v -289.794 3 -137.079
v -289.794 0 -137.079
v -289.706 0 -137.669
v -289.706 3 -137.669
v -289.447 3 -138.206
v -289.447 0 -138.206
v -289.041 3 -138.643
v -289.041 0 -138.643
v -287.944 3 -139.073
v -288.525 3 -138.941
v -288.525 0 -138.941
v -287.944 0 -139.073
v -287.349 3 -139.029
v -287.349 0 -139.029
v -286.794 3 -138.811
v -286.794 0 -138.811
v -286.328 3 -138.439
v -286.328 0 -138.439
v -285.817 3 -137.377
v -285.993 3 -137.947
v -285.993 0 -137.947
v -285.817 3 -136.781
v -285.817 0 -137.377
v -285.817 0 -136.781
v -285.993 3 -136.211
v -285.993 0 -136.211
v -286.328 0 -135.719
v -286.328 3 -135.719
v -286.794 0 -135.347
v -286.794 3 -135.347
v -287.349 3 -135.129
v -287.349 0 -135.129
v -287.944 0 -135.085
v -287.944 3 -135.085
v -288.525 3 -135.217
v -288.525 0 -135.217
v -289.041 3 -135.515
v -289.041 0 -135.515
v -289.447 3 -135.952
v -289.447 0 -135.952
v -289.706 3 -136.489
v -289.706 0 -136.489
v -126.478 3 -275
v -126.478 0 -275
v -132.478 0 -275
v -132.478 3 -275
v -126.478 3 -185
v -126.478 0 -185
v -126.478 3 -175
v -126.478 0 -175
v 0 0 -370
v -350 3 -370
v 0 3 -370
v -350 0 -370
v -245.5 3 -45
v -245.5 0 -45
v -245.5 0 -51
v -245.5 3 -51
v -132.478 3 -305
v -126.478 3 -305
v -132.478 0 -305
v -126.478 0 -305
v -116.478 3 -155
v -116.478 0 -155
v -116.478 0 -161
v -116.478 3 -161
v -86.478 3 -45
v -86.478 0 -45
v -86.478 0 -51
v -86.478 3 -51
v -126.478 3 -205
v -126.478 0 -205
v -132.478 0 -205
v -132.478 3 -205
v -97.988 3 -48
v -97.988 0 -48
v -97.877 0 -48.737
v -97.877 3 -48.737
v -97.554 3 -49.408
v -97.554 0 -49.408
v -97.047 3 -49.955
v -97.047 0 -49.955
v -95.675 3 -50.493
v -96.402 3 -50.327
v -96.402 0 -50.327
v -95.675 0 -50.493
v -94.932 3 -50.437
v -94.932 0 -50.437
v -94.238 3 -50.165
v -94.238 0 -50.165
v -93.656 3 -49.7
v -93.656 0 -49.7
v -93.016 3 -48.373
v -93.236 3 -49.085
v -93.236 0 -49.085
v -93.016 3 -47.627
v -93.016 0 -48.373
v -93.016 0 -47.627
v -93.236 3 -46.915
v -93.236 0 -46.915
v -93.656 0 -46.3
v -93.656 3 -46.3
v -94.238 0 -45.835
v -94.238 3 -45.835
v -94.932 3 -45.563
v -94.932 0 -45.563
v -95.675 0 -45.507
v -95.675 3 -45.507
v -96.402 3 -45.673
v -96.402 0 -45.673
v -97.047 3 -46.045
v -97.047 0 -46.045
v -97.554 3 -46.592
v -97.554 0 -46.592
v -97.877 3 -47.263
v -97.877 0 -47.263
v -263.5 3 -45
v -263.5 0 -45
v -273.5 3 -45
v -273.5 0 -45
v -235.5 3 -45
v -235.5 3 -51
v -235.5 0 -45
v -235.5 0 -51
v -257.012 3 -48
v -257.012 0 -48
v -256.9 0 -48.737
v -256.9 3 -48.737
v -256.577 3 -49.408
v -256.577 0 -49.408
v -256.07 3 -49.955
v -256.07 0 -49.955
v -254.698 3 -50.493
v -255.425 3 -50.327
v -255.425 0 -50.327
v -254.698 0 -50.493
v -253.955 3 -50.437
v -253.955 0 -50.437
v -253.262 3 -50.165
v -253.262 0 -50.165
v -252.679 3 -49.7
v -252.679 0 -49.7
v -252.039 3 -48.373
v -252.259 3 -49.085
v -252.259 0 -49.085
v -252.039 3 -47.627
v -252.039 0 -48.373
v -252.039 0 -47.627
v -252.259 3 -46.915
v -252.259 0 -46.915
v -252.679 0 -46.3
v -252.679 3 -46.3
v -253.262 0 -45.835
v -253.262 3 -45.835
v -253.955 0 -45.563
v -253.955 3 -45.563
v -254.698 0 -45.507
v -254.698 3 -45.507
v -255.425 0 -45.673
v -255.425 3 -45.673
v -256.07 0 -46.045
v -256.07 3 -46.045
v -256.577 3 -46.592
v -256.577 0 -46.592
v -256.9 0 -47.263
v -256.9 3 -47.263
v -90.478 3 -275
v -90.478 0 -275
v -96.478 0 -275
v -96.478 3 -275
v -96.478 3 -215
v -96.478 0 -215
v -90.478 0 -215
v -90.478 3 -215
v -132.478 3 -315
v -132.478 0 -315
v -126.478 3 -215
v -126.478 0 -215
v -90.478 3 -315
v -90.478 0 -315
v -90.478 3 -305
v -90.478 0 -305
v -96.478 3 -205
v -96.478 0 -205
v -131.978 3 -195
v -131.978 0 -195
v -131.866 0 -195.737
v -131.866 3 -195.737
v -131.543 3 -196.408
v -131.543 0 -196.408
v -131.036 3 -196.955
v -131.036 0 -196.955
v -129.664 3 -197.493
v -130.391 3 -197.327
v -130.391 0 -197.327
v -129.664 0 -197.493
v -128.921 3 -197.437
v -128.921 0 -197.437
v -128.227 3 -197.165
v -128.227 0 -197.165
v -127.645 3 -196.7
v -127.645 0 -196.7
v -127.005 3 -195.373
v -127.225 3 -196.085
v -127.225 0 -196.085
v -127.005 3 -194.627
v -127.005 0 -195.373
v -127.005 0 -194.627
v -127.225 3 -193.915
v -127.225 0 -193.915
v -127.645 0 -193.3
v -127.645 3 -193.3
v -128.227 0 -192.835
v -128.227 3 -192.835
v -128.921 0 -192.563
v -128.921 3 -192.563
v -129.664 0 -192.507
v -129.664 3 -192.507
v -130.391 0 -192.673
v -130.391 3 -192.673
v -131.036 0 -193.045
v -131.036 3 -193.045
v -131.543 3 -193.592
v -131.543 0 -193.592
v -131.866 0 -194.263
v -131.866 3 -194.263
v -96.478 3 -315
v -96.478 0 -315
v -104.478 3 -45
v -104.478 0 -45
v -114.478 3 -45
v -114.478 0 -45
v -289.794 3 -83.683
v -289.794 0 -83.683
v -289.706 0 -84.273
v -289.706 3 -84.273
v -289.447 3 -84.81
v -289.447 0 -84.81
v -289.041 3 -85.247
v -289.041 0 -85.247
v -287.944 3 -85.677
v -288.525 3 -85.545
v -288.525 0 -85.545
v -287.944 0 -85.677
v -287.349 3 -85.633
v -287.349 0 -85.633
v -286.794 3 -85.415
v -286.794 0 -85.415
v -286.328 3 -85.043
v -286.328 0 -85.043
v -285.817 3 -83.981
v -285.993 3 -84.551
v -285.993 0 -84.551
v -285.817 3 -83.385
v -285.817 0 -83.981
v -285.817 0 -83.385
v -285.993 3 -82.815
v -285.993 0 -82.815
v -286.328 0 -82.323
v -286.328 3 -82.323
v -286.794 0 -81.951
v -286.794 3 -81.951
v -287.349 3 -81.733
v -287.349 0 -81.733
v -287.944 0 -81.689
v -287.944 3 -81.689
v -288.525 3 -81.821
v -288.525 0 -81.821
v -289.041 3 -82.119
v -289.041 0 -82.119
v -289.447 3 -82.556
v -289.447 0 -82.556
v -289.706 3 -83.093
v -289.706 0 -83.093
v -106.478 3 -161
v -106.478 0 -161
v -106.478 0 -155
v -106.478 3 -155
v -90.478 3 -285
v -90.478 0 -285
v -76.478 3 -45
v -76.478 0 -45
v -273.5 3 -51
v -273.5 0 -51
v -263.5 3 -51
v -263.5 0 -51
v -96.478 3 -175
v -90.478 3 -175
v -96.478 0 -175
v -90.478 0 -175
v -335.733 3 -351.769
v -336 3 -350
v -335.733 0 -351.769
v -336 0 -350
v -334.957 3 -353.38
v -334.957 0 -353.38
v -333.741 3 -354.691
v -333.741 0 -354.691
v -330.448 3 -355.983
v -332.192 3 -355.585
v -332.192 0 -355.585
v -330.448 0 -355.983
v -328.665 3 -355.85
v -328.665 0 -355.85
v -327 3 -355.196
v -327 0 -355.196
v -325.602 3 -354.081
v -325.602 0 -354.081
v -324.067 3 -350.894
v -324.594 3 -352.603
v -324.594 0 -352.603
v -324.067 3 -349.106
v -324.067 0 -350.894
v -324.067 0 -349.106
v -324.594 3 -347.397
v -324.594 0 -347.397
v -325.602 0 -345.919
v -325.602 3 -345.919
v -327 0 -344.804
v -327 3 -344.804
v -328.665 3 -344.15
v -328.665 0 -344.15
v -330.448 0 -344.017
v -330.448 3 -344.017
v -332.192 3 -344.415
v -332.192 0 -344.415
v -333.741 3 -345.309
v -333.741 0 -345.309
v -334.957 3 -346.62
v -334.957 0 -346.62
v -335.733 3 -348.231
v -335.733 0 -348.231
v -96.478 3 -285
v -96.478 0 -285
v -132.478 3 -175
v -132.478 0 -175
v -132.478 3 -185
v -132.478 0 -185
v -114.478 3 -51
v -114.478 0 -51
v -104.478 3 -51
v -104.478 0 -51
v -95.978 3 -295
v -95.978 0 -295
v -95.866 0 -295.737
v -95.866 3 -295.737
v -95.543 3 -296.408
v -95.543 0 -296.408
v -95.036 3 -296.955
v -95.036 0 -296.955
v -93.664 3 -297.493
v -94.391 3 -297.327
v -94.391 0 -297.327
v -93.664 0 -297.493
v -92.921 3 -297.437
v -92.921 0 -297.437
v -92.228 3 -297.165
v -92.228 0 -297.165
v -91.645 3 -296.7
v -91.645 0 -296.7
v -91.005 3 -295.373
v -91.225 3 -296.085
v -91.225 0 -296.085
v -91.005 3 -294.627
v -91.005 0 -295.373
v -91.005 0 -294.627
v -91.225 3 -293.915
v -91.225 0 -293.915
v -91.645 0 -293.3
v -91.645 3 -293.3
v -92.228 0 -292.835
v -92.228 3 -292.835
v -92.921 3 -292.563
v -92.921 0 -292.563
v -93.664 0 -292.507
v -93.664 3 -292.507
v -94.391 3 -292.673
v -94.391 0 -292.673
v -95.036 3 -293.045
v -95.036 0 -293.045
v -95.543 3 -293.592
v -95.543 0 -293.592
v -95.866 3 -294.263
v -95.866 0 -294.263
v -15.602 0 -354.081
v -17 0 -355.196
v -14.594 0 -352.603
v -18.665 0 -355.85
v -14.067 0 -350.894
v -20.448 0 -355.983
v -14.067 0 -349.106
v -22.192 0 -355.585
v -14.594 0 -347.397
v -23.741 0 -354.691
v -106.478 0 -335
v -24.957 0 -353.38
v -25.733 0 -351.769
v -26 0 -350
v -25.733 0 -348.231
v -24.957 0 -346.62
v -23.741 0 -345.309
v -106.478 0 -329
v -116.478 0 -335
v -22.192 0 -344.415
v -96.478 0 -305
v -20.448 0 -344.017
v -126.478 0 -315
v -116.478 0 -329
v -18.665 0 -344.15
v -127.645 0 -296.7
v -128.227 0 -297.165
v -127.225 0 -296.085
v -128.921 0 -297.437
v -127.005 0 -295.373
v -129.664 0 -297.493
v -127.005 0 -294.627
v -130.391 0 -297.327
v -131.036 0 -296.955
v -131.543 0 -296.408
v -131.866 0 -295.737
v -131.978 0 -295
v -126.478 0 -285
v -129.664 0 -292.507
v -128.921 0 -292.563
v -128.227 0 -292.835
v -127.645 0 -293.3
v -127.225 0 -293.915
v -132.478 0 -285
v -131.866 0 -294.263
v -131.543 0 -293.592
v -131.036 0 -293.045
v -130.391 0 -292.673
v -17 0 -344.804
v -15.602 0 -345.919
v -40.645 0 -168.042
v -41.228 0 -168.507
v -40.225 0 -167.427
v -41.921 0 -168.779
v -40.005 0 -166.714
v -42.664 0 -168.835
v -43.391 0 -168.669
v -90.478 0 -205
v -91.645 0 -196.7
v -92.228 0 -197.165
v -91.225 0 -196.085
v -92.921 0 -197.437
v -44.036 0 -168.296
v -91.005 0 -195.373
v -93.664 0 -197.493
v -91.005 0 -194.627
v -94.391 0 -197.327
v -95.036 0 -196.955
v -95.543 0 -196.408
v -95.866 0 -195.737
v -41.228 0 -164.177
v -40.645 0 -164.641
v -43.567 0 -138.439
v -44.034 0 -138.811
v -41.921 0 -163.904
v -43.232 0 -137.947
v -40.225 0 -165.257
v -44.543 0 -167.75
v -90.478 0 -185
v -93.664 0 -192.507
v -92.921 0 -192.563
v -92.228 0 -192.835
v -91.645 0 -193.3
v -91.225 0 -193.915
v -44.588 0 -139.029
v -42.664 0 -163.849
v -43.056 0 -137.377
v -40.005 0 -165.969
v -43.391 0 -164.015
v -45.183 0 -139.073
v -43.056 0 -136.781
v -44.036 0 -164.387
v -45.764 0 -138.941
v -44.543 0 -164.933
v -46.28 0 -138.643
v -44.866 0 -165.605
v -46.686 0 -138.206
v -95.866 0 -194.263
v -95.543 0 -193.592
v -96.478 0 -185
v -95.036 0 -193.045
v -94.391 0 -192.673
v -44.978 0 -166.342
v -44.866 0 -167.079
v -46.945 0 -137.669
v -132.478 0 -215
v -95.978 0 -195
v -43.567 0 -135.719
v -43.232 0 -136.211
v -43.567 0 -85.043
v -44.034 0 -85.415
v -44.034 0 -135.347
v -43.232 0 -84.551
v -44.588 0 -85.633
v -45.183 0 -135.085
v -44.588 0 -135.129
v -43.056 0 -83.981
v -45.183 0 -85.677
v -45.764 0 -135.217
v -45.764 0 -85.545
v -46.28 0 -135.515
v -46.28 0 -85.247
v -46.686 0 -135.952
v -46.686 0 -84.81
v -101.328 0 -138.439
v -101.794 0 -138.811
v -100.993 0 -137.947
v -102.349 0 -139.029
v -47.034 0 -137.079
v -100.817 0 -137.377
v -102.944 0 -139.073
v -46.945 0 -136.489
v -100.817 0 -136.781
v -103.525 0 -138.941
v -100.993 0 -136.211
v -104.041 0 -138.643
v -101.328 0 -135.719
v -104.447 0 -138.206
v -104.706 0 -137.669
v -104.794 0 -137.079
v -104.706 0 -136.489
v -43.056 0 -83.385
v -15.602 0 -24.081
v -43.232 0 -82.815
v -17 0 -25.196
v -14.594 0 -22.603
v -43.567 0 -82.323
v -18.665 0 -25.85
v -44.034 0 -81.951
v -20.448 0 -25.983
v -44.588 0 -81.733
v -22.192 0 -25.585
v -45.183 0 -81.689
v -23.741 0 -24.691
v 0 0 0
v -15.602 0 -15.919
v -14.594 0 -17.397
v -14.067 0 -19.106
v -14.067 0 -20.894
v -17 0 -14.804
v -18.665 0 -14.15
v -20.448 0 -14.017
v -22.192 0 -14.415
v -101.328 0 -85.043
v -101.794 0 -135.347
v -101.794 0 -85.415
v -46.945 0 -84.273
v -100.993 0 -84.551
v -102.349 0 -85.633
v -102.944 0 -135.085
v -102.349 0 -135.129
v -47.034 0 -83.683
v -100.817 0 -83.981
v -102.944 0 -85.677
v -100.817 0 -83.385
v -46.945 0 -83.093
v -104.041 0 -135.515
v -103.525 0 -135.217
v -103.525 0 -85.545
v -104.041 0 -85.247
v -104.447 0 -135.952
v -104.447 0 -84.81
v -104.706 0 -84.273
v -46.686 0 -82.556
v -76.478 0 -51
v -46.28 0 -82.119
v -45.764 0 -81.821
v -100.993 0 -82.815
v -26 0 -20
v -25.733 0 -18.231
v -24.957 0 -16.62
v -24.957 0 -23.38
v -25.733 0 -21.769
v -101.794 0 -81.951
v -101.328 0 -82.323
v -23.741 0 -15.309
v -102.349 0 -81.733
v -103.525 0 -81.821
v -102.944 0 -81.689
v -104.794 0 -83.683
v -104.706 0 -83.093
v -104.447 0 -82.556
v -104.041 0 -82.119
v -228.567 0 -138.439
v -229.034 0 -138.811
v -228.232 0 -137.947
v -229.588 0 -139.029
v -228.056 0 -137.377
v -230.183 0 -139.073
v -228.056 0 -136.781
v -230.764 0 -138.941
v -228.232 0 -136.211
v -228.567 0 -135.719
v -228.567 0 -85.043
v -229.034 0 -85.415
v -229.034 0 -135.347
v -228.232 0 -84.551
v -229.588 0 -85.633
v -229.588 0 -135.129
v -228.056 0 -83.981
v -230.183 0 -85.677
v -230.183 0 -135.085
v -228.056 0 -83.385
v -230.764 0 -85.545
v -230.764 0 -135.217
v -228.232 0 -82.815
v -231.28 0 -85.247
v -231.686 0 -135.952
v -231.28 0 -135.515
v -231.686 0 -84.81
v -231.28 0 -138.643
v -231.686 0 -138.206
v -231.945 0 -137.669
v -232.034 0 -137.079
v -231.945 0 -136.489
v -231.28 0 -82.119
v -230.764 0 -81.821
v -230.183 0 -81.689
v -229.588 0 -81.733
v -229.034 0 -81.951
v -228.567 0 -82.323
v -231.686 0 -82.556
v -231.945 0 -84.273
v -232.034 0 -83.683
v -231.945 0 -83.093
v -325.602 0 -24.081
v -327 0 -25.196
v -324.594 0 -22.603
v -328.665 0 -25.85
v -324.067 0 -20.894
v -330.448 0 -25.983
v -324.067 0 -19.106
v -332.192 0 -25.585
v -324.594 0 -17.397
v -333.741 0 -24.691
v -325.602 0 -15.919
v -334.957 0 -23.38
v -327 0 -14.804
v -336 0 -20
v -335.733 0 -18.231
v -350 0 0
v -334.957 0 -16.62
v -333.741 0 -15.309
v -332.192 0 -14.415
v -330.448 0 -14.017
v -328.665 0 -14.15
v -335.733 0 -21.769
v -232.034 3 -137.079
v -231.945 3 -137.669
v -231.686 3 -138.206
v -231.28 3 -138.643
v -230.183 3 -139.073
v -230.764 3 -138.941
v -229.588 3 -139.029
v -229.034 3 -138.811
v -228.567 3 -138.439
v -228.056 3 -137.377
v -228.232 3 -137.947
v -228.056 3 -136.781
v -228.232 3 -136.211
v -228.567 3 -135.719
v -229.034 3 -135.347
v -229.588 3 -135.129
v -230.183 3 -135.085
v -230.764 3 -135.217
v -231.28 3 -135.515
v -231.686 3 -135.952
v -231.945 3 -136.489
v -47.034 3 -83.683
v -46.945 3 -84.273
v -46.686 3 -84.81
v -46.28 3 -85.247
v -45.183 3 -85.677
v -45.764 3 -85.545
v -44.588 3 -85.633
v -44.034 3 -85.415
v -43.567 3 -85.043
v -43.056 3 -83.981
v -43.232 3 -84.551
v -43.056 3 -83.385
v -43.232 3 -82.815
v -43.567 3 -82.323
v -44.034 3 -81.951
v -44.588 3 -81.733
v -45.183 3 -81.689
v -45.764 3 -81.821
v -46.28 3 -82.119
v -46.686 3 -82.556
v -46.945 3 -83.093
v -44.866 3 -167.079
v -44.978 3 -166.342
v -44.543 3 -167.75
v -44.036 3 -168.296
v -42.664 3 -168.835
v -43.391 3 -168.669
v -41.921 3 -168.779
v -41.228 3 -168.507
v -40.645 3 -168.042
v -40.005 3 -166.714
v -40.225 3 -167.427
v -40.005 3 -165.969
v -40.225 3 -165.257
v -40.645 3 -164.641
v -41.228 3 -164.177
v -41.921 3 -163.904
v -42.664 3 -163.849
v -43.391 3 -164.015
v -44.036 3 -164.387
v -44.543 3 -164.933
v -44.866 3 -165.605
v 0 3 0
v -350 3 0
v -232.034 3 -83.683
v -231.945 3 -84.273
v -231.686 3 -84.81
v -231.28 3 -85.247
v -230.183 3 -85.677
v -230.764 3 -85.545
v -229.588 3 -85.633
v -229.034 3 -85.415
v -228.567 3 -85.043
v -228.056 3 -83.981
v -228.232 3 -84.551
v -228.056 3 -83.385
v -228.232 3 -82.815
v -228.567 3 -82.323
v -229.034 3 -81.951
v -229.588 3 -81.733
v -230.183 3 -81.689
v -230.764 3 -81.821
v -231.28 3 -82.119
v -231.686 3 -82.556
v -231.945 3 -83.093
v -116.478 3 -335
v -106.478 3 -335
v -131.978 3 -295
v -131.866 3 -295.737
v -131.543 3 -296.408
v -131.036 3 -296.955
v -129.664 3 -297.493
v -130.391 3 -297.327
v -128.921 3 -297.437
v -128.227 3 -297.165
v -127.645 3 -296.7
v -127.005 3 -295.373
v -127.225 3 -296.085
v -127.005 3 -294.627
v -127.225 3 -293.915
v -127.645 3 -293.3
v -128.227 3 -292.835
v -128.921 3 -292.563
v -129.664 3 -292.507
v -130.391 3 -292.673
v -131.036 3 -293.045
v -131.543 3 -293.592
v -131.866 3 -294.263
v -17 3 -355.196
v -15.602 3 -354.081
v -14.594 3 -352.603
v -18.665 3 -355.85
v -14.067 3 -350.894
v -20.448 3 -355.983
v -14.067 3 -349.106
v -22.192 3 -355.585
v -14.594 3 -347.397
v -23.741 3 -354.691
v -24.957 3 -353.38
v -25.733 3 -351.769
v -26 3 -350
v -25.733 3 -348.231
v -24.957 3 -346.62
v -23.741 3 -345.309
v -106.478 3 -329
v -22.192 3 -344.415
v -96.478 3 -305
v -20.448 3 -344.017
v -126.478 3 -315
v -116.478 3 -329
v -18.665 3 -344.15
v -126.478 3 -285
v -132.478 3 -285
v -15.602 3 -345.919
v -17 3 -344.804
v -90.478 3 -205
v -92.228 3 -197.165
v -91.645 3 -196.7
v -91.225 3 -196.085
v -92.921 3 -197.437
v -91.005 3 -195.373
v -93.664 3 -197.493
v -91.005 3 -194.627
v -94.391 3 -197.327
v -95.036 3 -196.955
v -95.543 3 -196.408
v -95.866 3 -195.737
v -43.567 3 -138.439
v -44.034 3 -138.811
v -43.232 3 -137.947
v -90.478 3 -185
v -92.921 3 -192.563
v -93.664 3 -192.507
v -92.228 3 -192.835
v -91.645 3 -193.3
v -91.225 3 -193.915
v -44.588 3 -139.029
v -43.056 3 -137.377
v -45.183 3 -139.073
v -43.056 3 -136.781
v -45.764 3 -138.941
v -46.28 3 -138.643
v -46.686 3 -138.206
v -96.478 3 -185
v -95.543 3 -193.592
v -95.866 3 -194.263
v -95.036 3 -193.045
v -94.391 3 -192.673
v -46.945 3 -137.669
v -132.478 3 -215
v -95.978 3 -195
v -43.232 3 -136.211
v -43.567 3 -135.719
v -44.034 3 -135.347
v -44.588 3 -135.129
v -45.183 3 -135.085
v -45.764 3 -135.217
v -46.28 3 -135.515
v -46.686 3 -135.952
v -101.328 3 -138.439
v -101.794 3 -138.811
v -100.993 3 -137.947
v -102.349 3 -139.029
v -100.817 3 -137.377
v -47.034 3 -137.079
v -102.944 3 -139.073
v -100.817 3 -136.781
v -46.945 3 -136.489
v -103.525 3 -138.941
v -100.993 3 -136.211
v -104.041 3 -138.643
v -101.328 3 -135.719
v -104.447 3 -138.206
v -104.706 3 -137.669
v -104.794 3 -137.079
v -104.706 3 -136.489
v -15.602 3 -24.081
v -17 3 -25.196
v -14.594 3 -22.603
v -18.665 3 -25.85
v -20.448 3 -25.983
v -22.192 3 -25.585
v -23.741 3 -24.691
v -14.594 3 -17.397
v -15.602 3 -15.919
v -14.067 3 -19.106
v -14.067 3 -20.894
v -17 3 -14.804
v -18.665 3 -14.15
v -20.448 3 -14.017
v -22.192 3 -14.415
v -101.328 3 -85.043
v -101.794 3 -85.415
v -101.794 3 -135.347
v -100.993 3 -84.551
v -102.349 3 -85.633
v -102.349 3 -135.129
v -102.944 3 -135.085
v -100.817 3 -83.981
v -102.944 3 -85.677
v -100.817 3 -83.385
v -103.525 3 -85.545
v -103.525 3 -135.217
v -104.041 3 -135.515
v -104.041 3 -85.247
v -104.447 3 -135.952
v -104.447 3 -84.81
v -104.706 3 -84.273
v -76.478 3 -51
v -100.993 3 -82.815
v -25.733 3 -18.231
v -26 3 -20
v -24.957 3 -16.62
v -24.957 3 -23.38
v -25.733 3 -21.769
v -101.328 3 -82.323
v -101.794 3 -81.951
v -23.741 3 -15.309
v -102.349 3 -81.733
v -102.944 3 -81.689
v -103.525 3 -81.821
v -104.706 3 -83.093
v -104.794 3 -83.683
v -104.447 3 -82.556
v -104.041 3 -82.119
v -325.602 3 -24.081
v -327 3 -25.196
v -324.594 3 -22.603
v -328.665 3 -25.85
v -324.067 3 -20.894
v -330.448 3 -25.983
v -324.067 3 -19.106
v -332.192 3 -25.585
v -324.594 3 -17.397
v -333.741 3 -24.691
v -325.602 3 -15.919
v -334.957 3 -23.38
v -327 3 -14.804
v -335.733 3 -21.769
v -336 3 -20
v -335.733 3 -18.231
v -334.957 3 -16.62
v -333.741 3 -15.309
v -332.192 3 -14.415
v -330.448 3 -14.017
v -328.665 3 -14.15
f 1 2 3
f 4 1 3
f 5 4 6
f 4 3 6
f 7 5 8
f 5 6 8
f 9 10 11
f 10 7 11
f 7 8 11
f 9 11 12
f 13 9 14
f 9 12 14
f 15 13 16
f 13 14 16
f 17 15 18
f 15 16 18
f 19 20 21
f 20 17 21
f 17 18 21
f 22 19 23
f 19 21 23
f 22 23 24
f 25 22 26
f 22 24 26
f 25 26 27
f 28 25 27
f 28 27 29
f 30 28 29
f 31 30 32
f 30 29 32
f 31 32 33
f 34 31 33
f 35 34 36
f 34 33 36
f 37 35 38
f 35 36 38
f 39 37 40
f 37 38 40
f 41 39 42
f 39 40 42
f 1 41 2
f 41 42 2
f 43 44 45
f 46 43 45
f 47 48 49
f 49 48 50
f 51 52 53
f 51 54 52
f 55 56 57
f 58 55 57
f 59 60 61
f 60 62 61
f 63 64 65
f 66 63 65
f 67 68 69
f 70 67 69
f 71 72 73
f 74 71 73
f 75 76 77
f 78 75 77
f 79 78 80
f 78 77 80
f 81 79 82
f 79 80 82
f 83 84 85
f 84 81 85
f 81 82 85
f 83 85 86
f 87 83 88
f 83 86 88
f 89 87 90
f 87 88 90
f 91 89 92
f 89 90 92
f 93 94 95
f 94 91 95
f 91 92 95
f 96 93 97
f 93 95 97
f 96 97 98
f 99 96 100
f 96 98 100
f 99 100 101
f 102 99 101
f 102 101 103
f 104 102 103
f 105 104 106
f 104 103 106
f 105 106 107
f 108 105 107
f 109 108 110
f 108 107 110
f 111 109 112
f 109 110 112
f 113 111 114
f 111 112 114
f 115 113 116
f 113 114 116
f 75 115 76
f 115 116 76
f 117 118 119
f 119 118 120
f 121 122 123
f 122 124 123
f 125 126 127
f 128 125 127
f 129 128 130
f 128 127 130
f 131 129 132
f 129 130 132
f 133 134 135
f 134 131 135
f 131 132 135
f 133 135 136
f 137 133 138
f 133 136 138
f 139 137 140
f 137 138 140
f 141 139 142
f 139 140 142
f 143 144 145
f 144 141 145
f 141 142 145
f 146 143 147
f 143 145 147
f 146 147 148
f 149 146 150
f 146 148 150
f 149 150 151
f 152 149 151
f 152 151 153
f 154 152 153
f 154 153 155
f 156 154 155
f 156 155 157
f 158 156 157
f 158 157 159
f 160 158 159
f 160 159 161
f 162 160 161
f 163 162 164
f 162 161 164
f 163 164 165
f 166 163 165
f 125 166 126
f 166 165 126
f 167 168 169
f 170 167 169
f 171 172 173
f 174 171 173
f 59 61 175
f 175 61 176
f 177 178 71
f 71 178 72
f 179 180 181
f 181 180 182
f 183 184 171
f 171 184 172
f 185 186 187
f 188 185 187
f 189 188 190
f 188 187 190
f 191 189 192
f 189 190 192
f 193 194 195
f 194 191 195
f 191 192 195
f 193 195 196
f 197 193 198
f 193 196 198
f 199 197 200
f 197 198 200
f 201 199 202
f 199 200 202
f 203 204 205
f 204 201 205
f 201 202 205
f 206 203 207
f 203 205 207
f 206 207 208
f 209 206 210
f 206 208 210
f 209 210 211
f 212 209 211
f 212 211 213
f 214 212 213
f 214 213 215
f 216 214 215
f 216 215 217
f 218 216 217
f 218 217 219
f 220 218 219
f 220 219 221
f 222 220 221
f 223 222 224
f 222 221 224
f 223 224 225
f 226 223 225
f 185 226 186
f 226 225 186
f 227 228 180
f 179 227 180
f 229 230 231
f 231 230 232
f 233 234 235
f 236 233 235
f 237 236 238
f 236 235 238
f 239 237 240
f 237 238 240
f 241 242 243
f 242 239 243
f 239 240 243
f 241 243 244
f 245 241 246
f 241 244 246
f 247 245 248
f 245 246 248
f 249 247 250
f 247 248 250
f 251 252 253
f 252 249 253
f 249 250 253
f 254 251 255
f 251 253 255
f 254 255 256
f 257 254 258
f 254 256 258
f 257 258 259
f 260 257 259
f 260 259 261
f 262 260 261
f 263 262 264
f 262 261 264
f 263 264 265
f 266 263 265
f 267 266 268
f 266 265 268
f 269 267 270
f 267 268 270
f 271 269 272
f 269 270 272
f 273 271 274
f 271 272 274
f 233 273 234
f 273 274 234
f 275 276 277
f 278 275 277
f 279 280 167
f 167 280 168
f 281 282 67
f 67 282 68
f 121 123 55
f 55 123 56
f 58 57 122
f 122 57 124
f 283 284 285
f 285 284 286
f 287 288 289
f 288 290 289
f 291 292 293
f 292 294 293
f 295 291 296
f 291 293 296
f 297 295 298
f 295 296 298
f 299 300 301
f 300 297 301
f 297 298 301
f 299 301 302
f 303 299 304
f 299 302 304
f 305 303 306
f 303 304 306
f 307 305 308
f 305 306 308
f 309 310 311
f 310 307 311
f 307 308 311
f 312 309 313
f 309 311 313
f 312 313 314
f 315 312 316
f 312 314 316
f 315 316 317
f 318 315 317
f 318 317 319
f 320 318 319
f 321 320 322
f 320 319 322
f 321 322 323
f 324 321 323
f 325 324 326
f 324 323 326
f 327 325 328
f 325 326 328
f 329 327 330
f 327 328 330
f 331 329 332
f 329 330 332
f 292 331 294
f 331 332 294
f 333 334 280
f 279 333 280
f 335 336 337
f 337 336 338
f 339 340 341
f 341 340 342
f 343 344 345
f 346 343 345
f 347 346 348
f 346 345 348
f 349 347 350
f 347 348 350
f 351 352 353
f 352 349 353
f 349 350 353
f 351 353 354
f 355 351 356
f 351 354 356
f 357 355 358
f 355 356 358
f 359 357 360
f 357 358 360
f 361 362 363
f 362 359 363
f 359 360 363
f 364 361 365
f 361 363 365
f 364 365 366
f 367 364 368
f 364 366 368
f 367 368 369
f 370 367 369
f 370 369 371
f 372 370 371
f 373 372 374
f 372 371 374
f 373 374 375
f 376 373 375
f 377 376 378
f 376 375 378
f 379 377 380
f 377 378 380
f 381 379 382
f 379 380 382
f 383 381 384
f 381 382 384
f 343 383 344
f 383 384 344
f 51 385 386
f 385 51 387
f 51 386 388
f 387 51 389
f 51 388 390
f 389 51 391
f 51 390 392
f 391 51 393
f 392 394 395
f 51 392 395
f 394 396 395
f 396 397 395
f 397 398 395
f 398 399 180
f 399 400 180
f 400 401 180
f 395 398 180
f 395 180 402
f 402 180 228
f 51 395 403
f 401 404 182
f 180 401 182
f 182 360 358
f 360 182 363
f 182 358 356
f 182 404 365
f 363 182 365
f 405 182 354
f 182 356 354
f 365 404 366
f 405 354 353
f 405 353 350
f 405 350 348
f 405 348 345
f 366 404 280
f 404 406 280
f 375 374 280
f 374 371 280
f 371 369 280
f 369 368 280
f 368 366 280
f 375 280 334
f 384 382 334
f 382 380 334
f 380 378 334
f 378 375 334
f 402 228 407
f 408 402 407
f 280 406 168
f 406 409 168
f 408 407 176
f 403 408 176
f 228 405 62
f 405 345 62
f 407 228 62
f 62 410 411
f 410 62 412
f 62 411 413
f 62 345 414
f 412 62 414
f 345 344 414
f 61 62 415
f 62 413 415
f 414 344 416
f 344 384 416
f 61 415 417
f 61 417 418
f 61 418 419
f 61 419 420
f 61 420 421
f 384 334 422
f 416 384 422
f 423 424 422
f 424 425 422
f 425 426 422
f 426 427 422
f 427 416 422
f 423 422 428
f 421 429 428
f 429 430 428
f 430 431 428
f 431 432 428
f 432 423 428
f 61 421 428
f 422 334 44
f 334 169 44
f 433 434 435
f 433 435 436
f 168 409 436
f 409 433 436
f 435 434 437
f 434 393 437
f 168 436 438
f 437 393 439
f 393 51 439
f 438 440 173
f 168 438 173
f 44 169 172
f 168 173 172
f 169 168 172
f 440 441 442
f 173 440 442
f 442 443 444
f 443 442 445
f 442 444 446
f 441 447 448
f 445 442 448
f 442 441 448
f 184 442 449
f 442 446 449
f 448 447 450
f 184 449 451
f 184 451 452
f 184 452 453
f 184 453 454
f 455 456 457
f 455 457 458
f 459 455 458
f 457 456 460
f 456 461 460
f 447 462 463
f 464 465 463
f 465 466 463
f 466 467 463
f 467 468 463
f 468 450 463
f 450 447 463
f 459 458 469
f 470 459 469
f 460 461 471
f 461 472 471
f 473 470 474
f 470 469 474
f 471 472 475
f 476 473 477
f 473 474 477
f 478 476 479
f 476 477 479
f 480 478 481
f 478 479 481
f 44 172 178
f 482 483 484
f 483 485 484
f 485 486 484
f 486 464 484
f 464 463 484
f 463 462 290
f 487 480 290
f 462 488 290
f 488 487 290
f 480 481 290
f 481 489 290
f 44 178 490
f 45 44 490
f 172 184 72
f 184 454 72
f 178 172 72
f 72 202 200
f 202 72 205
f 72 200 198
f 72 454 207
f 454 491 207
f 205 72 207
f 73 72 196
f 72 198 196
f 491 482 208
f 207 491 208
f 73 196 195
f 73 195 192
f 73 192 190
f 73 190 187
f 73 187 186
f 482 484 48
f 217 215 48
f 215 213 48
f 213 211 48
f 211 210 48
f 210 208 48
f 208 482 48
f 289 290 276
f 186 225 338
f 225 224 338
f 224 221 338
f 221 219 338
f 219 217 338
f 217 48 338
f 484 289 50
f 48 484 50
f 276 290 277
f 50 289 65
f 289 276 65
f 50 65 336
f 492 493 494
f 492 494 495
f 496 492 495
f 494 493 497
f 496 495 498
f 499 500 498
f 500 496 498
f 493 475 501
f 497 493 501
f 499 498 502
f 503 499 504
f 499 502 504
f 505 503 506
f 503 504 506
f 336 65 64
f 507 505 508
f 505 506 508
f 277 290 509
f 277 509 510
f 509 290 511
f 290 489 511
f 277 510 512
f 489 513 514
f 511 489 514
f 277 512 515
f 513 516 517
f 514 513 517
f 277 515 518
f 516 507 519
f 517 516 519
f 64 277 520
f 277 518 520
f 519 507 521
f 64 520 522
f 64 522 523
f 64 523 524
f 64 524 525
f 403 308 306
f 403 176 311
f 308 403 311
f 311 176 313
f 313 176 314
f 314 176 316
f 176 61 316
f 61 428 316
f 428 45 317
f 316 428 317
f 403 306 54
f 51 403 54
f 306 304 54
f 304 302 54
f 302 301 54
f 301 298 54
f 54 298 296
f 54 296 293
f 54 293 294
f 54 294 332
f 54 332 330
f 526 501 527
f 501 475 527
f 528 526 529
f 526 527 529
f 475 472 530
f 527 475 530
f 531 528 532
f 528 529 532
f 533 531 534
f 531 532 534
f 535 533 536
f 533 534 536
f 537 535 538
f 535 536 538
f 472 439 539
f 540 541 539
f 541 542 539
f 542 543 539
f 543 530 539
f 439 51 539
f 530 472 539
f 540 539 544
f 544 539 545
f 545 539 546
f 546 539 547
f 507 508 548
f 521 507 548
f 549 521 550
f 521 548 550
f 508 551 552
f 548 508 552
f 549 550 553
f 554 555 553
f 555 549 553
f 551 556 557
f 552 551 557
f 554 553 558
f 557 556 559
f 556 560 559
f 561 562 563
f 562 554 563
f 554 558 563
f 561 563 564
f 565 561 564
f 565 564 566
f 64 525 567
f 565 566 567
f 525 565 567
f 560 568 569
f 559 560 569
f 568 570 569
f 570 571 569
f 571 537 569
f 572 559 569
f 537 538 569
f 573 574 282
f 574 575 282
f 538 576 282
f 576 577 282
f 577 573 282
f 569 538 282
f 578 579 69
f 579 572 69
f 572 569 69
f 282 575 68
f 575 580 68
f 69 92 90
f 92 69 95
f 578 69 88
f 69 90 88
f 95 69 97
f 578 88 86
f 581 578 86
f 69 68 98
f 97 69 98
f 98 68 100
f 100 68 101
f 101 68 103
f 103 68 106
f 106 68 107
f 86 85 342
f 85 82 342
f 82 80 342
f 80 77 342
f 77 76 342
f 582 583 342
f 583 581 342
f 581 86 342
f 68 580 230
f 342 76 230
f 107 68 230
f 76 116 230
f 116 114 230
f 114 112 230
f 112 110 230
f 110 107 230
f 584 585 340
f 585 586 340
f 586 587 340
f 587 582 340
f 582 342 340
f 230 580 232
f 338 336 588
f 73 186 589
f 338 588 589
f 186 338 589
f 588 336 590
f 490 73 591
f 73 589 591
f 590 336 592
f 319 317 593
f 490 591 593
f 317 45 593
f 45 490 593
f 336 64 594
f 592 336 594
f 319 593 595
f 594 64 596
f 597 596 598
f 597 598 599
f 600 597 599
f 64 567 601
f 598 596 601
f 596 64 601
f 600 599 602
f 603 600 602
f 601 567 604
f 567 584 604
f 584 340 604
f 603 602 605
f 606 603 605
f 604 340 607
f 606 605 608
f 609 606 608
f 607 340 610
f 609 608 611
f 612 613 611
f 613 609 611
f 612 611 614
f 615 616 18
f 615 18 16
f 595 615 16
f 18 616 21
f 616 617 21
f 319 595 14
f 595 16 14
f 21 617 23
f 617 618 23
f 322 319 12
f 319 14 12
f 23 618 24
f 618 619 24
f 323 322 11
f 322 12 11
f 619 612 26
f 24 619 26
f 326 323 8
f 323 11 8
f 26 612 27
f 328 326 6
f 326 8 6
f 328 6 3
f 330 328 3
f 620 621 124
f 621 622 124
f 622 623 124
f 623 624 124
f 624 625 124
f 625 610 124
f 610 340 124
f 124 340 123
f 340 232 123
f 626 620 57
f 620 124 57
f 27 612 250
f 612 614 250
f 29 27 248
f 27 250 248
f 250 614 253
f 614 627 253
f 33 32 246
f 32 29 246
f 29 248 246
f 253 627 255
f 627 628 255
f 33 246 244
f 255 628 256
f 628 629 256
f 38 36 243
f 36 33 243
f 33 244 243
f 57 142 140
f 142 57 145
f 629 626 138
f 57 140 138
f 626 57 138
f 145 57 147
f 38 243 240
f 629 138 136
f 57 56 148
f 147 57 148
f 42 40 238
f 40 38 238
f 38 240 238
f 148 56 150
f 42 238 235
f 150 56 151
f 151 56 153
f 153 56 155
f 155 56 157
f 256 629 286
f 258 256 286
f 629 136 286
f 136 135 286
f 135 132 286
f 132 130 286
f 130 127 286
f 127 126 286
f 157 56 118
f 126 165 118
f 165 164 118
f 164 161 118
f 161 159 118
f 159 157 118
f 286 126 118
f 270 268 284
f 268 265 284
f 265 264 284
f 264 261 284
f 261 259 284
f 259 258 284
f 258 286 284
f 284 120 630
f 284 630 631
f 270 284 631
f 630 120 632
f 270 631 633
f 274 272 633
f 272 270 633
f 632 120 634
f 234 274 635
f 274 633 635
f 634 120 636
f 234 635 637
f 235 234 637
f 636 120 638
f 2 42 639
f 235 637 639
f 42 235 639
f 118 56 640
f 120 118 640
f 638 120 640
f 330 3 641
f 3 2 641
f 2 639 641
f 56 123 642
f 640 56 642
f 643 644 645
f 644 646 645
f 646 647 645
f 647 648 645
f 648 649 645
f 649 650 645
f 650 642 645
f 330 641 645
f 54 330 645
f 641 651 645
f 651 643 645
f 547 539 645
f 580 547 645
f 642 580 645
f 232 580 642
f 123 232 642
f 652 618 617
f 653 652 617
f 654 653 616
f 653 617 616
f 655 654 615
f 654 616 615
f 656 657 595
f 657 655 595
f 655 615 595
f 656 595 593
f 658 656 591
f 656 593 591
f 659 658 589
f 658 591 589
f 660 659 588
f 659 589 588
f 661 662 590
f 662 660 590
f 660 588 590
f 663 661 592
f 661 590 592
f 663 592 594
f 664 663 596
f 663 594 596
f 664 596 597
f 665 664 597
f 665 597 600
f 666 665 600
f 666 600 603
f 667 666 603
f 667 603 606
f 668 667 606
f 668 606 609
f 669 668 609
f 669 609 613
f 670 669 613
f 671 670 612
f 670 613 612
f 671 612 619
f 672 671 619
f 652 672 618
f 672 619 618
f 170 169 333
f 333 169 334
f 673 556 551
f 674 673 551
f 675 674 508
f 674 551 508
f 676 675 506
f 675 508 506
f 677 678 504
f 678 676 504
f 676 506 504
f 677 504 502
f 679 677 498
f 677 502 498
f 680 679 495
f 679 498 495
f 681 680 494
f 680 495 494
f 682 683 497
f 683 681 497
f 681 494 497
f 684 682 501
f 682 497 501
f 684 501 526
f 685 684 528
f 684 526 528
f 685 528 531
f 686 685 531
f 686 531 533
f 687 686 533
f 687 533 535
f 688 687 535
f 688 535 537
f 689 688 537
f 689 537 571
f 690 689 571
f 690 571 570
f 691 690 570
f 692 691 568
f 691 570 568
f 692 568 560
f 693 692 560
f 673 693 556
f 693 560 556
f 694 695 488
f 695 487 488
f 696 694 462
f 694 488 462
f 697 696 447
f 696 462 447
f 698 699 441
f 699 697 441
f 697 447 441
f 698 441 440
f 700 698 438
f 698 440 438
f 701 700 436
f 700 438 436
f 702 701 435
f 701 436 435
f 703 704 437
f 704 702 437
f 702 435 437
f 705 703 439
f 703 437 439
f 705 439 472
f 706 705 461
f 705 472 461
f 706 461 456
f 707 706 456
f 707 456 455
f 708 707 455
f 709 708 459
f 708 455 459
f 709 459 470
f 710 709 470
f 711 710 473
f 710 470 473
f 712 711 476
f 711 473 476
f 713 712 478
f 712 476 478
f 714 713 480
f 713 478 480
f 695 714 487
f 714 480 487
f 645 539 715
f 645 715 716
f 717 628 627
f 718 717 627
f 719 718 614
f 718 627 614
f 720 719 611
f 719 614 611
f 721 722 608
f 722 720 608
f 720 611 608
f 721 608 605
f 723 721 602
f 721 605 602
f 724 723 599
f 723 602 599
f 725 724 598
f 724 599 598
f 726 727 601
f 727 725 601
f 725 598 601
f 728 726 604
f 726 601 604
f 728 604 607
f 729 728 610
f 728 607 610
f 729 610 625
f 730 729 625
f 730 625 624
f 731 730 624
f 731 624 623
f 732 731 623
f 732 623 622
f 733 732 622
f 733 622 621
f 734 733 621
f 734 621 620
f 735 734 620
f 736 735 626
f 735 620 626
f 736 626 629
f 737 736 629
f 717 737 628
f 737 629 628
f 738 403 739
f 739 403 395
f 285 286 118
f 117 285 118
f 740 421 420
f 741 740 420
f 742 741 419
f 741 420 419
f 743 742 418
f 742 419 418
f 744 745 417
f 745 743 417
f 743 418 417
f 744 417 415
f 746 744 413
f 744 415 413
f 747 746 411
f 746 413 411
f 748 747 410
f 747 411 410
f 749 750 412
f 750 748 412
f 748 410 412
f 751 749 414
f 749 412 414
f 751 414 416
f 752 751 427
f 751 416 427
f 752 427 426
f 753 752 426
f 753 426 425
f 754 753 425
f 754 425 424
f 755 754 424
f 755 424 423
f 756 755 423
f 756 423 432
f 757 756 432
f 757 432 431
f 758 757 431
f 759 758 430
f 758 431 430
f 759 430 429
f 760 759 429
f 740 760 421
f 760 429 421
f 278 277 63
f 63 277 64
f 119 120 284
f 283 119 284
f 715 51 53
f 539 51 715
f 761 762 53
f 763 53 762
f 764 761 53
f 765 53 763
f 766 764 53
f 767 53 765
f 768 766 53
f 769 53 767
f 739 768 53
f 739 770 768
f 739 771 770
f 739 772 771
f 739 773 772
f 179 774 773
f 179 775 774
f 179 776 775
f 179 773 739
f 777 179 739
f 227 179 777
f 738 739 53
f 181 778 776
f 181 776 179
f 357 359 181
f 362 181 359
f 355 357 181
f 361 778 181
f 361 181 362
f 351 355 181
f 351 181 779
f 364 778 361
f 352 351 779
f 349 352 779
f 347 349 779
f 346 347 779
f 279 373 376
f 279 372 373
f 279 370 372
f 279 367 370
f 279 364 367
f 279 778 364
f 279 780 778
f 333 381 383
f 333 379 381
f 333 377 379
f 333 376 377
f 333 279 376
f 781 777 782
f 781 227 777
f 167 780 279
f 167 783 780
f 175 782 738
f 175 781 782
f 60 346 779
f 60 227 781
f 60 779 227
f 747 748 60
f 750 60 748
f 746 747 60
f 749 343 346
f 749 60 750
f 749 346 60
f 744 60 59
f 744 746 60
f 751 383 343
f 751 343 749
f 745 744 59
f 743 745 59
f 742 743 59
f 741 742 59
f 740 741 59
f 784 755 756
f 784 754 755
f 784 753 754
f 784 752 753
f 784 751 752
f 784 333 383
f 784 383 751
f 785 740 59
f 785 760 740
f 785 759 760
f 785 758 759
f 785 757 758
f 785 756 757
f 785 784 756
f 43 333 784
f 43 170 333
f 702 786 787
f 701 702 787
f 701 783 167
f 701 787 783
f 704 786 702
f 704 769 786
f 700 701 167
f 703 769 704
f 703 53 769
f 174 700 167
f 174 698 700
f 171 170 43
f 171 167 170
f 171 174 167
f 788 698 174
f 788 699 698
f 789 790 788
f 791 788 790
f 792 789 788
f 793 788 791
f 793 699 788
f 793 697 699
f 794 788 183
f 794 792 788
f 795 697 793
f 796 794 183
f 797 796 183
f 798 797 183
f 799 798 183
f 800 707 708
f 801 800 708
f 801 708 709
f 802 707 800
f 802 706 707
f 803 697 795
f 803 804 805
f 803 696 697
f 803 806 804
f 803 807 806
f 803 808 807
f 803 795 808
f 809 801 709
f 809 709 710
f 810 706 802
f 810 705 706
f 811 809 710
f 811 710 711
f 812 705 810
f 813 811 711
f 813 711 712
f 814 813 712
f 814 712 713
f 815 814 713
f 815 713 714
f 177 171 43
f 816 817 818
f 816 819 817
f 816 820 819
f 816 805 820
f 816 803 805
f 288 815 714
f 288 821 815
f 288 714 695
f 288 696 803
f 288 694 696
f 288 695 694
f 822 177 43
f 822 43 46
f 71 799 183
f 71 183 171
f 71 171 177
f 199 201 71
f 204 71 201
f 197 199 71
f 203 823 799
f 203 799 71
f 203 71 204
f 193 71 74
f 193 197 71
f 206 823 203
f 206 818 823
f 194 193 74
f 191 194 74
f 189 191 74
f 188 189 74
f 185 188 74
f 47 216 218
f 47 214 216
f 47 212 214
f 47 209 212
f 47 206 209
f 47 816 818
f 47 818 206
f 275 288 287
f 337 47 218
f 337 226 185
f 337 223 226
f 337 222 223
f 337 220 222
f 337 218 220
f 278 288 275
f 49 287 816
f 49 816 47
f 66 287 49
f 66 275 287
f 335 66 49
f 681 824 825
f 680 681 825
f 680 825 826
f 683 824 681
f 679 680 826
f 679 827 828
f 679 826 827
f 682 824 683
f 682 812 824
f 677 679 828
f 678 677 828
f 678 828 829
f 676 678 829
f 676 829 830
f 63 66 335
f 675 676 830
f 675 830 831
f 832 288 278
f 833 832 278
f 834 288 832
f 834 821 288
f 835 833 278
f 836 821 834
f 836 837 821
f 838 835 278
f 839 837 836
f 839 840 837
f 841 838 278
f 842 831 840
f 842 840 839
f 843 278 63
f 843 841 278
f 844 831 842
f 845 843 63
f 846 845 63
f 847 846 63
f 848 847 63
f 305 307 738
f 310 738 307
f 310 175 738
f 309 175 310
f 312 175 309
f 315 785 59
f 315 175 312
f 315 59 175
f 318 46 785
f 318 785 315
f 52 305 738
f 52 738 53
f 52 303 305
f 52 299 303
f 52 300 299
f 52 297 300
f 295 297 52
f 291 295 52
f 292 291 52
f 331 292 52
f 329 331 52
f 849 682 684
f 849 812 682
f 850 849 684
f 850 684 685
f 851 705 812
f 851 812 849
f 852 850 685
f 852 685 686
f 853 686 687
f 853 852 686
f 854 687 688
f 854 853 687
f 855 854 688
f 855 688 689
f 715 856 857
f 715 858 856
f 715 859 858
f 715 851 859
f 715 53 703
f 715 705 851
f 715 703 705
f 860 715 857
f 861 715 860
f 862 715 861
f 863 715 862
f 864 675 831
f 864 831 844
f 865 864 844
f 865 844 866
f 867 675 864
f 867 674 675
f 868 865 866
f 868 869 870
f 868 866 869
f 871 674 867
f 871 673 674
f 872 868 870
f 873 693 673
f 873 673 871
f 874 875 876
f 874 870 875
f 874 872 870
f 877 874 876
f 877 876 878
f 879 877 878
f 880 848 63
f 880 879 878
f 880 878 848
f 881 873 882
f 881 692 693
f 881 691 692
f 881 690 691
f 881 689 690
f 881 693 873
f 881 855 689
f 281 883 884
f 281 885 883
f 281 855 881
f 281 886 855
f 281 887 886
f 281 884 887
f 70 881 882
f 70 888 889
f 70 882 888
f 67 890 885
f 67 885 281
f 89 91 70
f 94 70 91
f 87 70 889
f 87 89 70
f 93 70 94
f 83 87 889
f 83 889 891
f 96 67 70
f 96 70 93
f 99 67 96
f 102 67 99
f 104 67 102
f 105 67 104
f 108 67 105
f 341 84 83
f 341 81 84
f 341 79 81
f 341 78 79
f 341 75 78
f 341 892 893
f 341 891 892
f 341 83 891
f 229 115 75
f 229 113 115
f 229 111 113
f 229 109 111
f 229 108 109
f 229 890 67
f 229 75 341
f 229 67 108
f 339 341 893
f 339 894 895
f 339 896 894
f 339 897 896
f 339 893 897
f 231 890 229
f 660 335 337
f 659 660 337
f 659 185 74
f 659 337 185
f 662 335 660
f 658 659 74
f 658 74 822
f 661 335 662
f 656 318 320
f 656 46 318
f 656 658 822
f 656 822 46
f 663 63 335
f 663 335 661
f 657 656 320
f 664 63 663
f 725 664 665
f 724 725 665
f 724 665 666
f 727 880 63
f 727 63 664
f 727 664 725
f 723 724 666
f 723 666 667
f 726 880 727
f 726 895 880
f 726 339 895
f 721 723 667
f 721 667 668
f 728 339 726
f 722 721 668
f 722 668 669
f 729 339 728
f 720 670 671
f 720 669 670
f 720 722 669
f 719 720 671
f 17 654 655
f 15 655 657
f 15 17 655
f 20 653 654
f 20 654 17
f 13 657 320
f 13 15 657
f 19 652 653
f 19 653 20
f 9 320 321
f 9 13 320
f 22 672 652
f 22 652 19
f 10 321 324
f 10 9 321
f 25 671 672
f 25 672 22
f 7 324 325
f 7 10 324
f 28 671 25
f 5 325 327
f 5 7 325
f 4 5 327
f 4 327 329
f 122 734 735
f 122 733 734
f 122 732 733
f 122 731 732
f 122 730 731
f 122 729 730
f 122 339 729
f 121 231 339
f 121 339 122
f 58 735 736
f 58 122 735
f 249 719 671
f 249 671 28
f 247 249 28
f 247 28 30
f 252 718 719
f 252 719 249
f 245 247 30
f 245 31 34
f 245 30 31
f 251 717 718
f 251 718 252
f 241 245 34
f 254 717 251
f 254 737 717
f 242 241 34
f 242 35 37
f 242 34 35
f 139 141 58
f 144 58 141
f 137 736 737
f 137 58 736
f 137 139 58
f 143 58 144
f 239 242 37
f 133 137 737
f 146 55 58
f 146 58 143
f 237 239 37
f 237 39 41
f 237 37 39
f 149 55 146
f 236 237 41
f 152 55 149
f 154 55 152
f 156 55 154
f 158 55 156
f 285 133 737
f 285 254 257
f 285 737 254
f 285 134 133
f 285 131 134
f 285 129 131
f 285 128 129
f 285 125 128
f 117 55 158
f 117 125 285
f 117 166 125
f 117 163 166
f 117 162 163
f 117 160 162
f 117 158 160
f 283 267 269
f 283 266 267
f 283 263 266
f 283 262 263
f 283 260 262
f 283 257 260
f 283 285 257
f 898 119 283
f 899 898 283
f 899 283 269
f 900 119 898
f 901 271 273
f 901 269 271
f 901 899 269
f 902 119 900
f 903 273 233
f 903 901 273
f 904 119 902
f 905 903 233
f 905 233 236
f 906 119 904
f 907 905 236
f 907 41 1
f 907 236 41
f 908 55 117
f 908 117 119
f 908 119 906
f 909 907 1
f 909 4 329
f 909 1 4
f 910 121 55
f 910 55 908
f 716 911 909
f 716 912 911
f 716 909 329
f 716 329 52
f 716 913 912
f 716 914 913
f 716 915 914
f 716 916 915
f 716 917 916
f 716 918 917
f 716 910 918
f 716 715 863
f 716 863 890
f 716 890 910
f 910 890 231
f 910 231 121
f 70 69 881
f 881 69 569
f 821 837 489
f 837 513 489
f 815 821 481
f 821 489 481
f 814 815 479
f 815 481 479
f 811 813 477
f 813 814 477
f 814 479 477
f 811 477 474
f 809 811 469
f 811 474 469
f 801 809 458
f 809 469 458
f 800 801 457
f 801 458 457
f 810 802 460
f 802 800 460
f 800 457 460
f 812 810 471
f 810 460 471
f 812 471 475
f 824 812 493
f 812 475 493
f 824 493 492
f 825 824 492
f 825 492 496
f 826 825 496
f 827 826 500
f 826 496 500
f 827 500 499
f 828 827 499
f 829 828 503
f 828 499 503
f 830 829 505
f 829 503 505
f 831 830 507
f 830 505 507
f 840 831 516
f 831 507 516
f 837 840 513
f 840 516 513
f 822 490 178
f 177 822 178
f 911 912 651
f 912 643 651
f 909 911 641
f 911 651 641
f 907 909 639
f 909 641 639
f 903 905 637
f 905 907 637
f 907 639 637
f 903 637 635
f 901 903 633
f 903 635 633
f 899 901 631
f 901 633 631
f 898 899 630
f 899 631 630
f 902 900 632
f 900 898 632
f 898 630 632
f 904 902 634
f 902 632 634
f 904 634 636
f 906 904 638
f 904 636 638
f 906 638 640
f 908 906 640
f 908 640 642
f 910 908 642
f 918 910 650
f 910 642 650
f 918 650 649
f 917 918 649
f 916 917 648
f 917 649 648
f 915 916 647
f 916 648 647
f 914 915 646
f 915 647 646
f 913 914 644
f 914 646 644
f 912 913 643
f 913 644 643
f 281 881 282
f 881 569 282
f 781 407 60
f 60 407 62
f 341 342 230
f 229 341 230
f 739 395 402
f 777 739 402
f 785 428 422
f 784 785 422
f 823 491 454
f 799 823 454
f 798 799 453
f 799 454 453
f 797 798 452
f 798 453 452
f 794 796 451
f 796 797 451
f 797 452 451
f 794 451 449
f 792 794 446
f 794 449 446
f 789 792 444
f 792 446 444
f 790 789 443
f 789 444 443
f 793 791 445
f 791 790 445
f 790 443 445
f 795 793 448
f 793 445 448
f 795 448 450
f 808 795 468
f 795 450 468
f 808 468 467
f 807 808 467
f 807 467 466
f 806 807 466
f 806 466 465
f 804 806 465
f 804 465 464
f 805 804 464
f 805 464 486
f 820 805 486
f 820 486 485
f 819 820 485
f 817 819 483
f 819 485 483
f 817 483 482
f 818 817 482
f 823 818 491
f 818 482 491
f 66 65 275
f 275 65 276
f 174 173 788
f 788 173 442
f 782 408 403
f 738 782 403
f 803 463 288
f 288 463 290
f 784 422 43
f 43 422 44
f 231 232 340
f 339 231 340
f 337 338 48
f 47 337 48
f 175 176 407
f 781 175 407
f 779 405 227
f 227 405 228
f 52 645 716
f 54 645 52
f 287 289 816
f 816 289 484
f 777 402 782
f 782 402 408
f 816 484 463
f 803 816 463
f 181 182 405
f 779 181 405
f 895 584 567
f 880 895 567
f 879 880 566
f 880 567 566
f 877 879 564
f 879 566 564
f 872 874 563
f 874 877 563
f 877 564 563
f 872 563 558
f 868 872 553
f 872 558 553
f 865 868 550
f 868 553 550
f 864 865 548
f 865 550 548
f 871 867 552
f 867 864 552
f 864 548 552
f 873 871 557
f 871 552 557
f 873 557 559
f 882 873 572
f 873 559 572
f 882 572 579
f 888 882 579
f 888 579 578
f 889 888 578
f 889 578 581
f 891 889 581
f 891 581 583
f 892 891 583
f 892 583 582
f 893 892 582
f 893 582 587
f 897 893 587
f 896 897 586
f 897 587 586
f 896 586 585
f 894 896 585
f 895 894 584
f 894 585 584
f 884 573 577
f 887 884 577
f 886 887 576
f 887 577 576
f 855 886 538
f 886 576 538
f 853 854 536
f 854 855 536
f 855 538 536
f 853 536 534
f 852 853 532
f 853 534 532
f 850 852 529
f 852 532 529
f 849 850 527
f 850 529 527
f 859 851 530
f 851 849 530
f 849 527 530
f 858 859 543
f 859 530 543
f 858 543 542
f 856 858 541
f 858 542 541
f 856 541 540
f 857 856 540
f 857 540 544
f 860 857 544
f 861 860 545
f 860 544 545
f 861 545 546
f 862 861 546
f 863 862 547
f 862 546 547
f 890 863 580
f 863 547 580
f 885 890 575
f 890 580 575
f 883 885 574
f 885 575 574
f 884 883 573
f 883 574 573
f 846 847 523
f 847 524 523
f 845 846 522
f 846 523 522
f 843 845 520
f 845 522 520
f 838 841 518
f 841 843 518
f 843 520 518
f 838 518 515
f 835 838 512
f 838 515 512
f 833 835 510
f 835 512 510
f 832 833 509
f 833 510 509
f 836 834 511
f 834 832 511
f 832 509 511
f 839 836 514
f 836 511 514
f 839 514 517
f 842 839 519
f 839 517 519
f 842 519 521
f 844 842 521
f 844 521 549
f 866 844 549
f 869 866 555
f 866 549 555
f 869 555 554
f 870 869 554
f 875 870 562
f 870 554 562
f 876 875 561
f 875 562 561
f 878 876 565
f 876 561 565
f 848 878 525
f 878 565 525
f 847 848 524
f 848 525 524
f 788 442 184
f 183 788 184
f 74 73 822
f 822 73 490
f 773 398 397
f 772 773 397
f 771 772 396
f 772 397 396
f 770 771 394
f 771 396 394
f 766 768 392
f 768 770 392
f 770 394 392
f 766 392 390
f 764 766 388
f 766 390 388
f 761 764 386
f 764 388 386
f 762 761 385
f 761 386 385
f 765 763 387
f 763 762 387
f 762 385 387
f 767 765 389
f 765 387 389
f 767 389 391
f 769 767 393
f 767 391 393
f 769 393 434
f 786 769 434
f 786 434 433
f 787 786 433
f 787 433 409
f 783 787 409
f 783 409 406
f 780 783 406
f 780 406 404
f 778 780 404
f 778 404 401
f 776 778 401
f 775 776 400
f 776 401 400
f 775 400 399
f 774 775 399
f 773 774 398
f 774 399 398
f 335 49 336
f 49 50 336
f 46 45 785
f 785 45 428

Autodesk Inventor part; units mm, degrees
ref_plane "YZ Plane" through (0, 0, 0) normal (1, 0, 0) x (0, 1, 0)
ref_plane "XZ Plane" through (0, 0, 0) normal (0, 1, 0) x (-1, 0, 0)
ref_plane "XY Plane" through (0, 0, 0) normal (0, 0, 1) x (1, 0, 0)
sketch "Boceto1" plane through (0, 0, 0) normal (0, 1, 0) x (-1, 0, 0)
  line L0 (0, 0) -> (350, 0)
  line L1 (350, 0) -> (350, -370)
  line L2 (350, -370) -> (0, -370)
  line L3 (0, -370) -> (0, 0)
  circle A0 centre (20, -350) radius 6
  circle A1 centre (254.5115, -48) radius 2.5
  circle A2 centre (95.4885, -48) radius 2.5
  line L4 (245.5005, -51) -> (235.5005, -51)
  line L5 (235.5005, -51) -> (235.5005, -45)
  line L6 (235.5005, -45) -> (245.5005, -45)
  line L7 (245.5005, -45) -> (245.5005, -51)
  line L8 (273.5005, -51) -> (263.5005, -51)
  line L9 (263.5005, -51) -> (263.5005, -45)
  line L10 (263.5005, -45) -> (273.5005, -45)
  line L11 (273.5005, -45) -> (273.5005, -51)
  line L12 (114.4775, -51) -> (104.4775, -51)
  line L13 (104.4775, -51) -> (104.4775, -45)
  line L14 (104.4775, -45) -> (114.4775, -45)
  line L15 (114.4775, -45) -> (114.4775, -51)
  line L16 (86.4775, -51) -> (76.4775, -51)
  line L17 (76.4775, -51) -> (76.4775, -45)
  line L18 (76.4775, -45) -> (86.4775, -45)
  line L19 (86.4775, -45) -> (86.4775, -51)
  line L20 (254.5115, -48) -> (95.4885, -48) construction
  line L21 (114.4775, -45) -> (129.4775, -45) construction
  line L22 (129.4775, -45) -> (129.4775, -295) construction
  circle A3 centre (129.4775, -295) radius 2.5
  line L23 (132.4775, -315) -> (126.4775, -315)
  line L24 (126.4775, -315) -> (126.4775, -305)
  line L25 (126.4775, -305) -> (132.4775, -305)
  line L26 (132.4775, -305) -> (132.4775, -315)
  line L27 (132.4775, -285) -> (126.4775, -285)
  line L28 (126.4775, -285) -> (126.4775, -275)
  line L29 (126.4775, -275) -> (132.4775, -275)
  line L30 (132.4775, -275) -> (132.4775, -285)
  line L31 (132.4775, -215) -> (126.4775, -215)
  line L32 (126.4775, -215) -> (126.4775, -205)
  line L33 (126.4775, -205) -> (132.4775, -205)
  line L34 (132.4775, -205) -> (132.4775, -215)
  circle A4 centre (129.4775, -195) radius 2.5
  line L35 (132.4775, -185) -> (126.4775, -185)
  line L36 (126.4775, -185) -> (126.4775, -175)
  line L37 (126.4775, -175) -> (132.4775, -175)
  line L38 (132.4775, -175) -> (132.4775, -185)
  line L39 (96.4775, -315) -> (90.4775, -315)
  line L40 (90.4775, -315) -> (90.4775, -305)
  line L41 (90.4775, -305) -> (96.4775, -305)
  line L42 (96.4775, -305) -> (96.4775, -315)
  circle A5 centre (93.4775, -295) radius 2.5
  line L43 (96.4775, -285) -> (90.4775, -285)
  line L44 (90.4775, -285) -> (90.4775, -275)
  line L45 (90.4775, -275) -> (96.4775, -275)
  line L46 (96.4775, -275) -> (96.4775, -285)
  line L47 (96.4775, -215) -> (90.4775, -215)
  line L48 (90.4775, -215) -> (90.4775, -205)
  line L49 (90.4775, -205) -> (96.4775, -205)
  line L50 (96.4775, -205) -> (96.4775, -215)
  line L51 (96.4775, -185) -> (90.4775, -185)
  line L52 (90.4775, -185) -> (90.4775, -175)
  line L53 (90.4775, -175) -> (96.4775, -175)
  line L54 (96.4775, -175) -> (96.4775, -185)
  circle A6 centre (93.4775, -195) radius 2.5
  line L55 (116.4775, -335) -> (106.4775, -335)
  line L56 (106.4775, -335) -> (106.4775, -329)
  line L57 (106.4775, -329) -> (116.4775, -329)
  line L58 (116.4775, -329) -> (116.4775, -335)
  line L59 (116.4775, -161) -> (106.4775, -161)
  line L60 (106.4775, -161) -> (106.4775, -155)
  line L61 (106.4775, -155) -> (116.4775, -155)
  line L62 (116.4775, -155) -> (116.4775, -161)
  circle A7 centre (330, -350) radius 6
  circle A8 centre (330, -20) radius 6
  circle A9 centre (20, -20) radius 6
  line L63 (106.4775, -140) -> (41.4775, -140) construction
  line L64 (41.4775, -140) -> (41.4775, -80) construction
  line L65 (41.4775, -80) -> (106.4775, -80) construction
  line L66 (106.4775, -80) -> (106.4775, -140) construction
  circle A10 centre (42.4775, -166.3418) radius 2.5
  circle A11 centre (102.7945, -137.079) radius 2
  circle A12 centre (45.0335, -137.079) radius 2
  circle A13 centre (45.0335, -83.683) radius 2
  circle A14 centre (102.7945, -83.683) radius 2
  line L67 (291.4775, -140) -> (226.4775, -140) construction
  line L68 (226.4775, -140) -> (226.4775, -80) construction
  line L69 (226.4775, -80) -> (291.4775, -80) construction
  line L70 (291.4775, -80) -> (291.4775, -140) construction
  circle A15 centre (287.7945, -137.079) radius 2
  circle A16 centre (230.0335, -137.079) radius 2
  circle A17 centre (230.0335, -83.683) radius 2
  circle A18 centre (287.7945, -83.683) radius 2
  point P0 (235.5005, -48)
  point P1 (263.5005, -48)
  point P2 (104.4775, -48)
  point P3 (175, 0)
  point P4 (175, -48)
  point P5 (129.4775, -305)
  point P6 (129.4775, -285)
  point P7 (129.4775, -215)
  point P8 (129.4775, -275)
  point P9 (129.4775, -185)
  point P10 (126.4775, -310)
  point P11 (96.4775, -310)
  point P12 (93.4775, -305)
  point P13 (93.4775, -285)
  point P14 (93.4775, -215)
  point P15 (93.4775, -275)
  point P16 (93.4775, -205)
  point P17 (93.4775, -175)
  dimension "d0" = 350
  dimension "d1" = 370
  dimension "d4" = 12
  dimension "d5" = 20
  dimension "d6" = 20
  dimension "d7" = 5
  dimension "d8" = 5
  dimension "d11" = 10
  dimension "d12" = 6
  dimension "d13" = 10
  dimension "d15" = 18
  dimension "d16" = 6
  dimension "d17" = 9.011
  dimension "d18" = 10
  dimension "d19" = 6
  dimension "d20" = 10
  dimension "d21" = 6
  dimension "d22" = 18
  dimension "d23" = 9.011
  dimension "d26" = 121.023
  dimension "d27" = 45
  dimension "d29" = 15
  dimension "d30" = 250
  dimension "d31" = 5
  dimension "d33" = 10
  dimension "d34" = 6
  dimension "d35" = 10
  dimension "d36" = 20
  dimension "d37" = 10
  dimension "d39" = 10
  dimension "d40" = 60
  dimension "d41" = 6
  dimension "d42" = 5
  dimension "d43" = 10
  dimension "d44" = 6
  dimension "d45" = 10
  dimension "d46" = 20
  dimension "d48" = 10
  dimension "d50" = 42
  dimension "d51" = 6
  dimension "d52" = 6
  dimension "d53" = 5
  dimension "d54" = 6
  dimension "d55" = 10
  dimension "d56" = 5
  dimension "d57" = 20
  dimension "d58" = 10
  dimension "d59" = 6
  dimension "d60" = 10
  dimension "d61" = 10
  dimension "d62" = 6
  dimension "d64" = 16
  dimension "d66" = 10
  dimension "d67" = 6
  dimension "d68" = 16
  dimension "d70" = 20
  dimension "d71" = 20
  dimension "d73" = 20
  dimension "d77" = 20
  dimension "d81" = 65
  dimension "d82" = 60
  dimension "d83" = 5
  dimension "d84" = 11.3418
  dimension "d85" = 48
extrude "Extrusión1" add sketch "Boceto1" along normal blind 3
properties part number "BaseProyecto"
